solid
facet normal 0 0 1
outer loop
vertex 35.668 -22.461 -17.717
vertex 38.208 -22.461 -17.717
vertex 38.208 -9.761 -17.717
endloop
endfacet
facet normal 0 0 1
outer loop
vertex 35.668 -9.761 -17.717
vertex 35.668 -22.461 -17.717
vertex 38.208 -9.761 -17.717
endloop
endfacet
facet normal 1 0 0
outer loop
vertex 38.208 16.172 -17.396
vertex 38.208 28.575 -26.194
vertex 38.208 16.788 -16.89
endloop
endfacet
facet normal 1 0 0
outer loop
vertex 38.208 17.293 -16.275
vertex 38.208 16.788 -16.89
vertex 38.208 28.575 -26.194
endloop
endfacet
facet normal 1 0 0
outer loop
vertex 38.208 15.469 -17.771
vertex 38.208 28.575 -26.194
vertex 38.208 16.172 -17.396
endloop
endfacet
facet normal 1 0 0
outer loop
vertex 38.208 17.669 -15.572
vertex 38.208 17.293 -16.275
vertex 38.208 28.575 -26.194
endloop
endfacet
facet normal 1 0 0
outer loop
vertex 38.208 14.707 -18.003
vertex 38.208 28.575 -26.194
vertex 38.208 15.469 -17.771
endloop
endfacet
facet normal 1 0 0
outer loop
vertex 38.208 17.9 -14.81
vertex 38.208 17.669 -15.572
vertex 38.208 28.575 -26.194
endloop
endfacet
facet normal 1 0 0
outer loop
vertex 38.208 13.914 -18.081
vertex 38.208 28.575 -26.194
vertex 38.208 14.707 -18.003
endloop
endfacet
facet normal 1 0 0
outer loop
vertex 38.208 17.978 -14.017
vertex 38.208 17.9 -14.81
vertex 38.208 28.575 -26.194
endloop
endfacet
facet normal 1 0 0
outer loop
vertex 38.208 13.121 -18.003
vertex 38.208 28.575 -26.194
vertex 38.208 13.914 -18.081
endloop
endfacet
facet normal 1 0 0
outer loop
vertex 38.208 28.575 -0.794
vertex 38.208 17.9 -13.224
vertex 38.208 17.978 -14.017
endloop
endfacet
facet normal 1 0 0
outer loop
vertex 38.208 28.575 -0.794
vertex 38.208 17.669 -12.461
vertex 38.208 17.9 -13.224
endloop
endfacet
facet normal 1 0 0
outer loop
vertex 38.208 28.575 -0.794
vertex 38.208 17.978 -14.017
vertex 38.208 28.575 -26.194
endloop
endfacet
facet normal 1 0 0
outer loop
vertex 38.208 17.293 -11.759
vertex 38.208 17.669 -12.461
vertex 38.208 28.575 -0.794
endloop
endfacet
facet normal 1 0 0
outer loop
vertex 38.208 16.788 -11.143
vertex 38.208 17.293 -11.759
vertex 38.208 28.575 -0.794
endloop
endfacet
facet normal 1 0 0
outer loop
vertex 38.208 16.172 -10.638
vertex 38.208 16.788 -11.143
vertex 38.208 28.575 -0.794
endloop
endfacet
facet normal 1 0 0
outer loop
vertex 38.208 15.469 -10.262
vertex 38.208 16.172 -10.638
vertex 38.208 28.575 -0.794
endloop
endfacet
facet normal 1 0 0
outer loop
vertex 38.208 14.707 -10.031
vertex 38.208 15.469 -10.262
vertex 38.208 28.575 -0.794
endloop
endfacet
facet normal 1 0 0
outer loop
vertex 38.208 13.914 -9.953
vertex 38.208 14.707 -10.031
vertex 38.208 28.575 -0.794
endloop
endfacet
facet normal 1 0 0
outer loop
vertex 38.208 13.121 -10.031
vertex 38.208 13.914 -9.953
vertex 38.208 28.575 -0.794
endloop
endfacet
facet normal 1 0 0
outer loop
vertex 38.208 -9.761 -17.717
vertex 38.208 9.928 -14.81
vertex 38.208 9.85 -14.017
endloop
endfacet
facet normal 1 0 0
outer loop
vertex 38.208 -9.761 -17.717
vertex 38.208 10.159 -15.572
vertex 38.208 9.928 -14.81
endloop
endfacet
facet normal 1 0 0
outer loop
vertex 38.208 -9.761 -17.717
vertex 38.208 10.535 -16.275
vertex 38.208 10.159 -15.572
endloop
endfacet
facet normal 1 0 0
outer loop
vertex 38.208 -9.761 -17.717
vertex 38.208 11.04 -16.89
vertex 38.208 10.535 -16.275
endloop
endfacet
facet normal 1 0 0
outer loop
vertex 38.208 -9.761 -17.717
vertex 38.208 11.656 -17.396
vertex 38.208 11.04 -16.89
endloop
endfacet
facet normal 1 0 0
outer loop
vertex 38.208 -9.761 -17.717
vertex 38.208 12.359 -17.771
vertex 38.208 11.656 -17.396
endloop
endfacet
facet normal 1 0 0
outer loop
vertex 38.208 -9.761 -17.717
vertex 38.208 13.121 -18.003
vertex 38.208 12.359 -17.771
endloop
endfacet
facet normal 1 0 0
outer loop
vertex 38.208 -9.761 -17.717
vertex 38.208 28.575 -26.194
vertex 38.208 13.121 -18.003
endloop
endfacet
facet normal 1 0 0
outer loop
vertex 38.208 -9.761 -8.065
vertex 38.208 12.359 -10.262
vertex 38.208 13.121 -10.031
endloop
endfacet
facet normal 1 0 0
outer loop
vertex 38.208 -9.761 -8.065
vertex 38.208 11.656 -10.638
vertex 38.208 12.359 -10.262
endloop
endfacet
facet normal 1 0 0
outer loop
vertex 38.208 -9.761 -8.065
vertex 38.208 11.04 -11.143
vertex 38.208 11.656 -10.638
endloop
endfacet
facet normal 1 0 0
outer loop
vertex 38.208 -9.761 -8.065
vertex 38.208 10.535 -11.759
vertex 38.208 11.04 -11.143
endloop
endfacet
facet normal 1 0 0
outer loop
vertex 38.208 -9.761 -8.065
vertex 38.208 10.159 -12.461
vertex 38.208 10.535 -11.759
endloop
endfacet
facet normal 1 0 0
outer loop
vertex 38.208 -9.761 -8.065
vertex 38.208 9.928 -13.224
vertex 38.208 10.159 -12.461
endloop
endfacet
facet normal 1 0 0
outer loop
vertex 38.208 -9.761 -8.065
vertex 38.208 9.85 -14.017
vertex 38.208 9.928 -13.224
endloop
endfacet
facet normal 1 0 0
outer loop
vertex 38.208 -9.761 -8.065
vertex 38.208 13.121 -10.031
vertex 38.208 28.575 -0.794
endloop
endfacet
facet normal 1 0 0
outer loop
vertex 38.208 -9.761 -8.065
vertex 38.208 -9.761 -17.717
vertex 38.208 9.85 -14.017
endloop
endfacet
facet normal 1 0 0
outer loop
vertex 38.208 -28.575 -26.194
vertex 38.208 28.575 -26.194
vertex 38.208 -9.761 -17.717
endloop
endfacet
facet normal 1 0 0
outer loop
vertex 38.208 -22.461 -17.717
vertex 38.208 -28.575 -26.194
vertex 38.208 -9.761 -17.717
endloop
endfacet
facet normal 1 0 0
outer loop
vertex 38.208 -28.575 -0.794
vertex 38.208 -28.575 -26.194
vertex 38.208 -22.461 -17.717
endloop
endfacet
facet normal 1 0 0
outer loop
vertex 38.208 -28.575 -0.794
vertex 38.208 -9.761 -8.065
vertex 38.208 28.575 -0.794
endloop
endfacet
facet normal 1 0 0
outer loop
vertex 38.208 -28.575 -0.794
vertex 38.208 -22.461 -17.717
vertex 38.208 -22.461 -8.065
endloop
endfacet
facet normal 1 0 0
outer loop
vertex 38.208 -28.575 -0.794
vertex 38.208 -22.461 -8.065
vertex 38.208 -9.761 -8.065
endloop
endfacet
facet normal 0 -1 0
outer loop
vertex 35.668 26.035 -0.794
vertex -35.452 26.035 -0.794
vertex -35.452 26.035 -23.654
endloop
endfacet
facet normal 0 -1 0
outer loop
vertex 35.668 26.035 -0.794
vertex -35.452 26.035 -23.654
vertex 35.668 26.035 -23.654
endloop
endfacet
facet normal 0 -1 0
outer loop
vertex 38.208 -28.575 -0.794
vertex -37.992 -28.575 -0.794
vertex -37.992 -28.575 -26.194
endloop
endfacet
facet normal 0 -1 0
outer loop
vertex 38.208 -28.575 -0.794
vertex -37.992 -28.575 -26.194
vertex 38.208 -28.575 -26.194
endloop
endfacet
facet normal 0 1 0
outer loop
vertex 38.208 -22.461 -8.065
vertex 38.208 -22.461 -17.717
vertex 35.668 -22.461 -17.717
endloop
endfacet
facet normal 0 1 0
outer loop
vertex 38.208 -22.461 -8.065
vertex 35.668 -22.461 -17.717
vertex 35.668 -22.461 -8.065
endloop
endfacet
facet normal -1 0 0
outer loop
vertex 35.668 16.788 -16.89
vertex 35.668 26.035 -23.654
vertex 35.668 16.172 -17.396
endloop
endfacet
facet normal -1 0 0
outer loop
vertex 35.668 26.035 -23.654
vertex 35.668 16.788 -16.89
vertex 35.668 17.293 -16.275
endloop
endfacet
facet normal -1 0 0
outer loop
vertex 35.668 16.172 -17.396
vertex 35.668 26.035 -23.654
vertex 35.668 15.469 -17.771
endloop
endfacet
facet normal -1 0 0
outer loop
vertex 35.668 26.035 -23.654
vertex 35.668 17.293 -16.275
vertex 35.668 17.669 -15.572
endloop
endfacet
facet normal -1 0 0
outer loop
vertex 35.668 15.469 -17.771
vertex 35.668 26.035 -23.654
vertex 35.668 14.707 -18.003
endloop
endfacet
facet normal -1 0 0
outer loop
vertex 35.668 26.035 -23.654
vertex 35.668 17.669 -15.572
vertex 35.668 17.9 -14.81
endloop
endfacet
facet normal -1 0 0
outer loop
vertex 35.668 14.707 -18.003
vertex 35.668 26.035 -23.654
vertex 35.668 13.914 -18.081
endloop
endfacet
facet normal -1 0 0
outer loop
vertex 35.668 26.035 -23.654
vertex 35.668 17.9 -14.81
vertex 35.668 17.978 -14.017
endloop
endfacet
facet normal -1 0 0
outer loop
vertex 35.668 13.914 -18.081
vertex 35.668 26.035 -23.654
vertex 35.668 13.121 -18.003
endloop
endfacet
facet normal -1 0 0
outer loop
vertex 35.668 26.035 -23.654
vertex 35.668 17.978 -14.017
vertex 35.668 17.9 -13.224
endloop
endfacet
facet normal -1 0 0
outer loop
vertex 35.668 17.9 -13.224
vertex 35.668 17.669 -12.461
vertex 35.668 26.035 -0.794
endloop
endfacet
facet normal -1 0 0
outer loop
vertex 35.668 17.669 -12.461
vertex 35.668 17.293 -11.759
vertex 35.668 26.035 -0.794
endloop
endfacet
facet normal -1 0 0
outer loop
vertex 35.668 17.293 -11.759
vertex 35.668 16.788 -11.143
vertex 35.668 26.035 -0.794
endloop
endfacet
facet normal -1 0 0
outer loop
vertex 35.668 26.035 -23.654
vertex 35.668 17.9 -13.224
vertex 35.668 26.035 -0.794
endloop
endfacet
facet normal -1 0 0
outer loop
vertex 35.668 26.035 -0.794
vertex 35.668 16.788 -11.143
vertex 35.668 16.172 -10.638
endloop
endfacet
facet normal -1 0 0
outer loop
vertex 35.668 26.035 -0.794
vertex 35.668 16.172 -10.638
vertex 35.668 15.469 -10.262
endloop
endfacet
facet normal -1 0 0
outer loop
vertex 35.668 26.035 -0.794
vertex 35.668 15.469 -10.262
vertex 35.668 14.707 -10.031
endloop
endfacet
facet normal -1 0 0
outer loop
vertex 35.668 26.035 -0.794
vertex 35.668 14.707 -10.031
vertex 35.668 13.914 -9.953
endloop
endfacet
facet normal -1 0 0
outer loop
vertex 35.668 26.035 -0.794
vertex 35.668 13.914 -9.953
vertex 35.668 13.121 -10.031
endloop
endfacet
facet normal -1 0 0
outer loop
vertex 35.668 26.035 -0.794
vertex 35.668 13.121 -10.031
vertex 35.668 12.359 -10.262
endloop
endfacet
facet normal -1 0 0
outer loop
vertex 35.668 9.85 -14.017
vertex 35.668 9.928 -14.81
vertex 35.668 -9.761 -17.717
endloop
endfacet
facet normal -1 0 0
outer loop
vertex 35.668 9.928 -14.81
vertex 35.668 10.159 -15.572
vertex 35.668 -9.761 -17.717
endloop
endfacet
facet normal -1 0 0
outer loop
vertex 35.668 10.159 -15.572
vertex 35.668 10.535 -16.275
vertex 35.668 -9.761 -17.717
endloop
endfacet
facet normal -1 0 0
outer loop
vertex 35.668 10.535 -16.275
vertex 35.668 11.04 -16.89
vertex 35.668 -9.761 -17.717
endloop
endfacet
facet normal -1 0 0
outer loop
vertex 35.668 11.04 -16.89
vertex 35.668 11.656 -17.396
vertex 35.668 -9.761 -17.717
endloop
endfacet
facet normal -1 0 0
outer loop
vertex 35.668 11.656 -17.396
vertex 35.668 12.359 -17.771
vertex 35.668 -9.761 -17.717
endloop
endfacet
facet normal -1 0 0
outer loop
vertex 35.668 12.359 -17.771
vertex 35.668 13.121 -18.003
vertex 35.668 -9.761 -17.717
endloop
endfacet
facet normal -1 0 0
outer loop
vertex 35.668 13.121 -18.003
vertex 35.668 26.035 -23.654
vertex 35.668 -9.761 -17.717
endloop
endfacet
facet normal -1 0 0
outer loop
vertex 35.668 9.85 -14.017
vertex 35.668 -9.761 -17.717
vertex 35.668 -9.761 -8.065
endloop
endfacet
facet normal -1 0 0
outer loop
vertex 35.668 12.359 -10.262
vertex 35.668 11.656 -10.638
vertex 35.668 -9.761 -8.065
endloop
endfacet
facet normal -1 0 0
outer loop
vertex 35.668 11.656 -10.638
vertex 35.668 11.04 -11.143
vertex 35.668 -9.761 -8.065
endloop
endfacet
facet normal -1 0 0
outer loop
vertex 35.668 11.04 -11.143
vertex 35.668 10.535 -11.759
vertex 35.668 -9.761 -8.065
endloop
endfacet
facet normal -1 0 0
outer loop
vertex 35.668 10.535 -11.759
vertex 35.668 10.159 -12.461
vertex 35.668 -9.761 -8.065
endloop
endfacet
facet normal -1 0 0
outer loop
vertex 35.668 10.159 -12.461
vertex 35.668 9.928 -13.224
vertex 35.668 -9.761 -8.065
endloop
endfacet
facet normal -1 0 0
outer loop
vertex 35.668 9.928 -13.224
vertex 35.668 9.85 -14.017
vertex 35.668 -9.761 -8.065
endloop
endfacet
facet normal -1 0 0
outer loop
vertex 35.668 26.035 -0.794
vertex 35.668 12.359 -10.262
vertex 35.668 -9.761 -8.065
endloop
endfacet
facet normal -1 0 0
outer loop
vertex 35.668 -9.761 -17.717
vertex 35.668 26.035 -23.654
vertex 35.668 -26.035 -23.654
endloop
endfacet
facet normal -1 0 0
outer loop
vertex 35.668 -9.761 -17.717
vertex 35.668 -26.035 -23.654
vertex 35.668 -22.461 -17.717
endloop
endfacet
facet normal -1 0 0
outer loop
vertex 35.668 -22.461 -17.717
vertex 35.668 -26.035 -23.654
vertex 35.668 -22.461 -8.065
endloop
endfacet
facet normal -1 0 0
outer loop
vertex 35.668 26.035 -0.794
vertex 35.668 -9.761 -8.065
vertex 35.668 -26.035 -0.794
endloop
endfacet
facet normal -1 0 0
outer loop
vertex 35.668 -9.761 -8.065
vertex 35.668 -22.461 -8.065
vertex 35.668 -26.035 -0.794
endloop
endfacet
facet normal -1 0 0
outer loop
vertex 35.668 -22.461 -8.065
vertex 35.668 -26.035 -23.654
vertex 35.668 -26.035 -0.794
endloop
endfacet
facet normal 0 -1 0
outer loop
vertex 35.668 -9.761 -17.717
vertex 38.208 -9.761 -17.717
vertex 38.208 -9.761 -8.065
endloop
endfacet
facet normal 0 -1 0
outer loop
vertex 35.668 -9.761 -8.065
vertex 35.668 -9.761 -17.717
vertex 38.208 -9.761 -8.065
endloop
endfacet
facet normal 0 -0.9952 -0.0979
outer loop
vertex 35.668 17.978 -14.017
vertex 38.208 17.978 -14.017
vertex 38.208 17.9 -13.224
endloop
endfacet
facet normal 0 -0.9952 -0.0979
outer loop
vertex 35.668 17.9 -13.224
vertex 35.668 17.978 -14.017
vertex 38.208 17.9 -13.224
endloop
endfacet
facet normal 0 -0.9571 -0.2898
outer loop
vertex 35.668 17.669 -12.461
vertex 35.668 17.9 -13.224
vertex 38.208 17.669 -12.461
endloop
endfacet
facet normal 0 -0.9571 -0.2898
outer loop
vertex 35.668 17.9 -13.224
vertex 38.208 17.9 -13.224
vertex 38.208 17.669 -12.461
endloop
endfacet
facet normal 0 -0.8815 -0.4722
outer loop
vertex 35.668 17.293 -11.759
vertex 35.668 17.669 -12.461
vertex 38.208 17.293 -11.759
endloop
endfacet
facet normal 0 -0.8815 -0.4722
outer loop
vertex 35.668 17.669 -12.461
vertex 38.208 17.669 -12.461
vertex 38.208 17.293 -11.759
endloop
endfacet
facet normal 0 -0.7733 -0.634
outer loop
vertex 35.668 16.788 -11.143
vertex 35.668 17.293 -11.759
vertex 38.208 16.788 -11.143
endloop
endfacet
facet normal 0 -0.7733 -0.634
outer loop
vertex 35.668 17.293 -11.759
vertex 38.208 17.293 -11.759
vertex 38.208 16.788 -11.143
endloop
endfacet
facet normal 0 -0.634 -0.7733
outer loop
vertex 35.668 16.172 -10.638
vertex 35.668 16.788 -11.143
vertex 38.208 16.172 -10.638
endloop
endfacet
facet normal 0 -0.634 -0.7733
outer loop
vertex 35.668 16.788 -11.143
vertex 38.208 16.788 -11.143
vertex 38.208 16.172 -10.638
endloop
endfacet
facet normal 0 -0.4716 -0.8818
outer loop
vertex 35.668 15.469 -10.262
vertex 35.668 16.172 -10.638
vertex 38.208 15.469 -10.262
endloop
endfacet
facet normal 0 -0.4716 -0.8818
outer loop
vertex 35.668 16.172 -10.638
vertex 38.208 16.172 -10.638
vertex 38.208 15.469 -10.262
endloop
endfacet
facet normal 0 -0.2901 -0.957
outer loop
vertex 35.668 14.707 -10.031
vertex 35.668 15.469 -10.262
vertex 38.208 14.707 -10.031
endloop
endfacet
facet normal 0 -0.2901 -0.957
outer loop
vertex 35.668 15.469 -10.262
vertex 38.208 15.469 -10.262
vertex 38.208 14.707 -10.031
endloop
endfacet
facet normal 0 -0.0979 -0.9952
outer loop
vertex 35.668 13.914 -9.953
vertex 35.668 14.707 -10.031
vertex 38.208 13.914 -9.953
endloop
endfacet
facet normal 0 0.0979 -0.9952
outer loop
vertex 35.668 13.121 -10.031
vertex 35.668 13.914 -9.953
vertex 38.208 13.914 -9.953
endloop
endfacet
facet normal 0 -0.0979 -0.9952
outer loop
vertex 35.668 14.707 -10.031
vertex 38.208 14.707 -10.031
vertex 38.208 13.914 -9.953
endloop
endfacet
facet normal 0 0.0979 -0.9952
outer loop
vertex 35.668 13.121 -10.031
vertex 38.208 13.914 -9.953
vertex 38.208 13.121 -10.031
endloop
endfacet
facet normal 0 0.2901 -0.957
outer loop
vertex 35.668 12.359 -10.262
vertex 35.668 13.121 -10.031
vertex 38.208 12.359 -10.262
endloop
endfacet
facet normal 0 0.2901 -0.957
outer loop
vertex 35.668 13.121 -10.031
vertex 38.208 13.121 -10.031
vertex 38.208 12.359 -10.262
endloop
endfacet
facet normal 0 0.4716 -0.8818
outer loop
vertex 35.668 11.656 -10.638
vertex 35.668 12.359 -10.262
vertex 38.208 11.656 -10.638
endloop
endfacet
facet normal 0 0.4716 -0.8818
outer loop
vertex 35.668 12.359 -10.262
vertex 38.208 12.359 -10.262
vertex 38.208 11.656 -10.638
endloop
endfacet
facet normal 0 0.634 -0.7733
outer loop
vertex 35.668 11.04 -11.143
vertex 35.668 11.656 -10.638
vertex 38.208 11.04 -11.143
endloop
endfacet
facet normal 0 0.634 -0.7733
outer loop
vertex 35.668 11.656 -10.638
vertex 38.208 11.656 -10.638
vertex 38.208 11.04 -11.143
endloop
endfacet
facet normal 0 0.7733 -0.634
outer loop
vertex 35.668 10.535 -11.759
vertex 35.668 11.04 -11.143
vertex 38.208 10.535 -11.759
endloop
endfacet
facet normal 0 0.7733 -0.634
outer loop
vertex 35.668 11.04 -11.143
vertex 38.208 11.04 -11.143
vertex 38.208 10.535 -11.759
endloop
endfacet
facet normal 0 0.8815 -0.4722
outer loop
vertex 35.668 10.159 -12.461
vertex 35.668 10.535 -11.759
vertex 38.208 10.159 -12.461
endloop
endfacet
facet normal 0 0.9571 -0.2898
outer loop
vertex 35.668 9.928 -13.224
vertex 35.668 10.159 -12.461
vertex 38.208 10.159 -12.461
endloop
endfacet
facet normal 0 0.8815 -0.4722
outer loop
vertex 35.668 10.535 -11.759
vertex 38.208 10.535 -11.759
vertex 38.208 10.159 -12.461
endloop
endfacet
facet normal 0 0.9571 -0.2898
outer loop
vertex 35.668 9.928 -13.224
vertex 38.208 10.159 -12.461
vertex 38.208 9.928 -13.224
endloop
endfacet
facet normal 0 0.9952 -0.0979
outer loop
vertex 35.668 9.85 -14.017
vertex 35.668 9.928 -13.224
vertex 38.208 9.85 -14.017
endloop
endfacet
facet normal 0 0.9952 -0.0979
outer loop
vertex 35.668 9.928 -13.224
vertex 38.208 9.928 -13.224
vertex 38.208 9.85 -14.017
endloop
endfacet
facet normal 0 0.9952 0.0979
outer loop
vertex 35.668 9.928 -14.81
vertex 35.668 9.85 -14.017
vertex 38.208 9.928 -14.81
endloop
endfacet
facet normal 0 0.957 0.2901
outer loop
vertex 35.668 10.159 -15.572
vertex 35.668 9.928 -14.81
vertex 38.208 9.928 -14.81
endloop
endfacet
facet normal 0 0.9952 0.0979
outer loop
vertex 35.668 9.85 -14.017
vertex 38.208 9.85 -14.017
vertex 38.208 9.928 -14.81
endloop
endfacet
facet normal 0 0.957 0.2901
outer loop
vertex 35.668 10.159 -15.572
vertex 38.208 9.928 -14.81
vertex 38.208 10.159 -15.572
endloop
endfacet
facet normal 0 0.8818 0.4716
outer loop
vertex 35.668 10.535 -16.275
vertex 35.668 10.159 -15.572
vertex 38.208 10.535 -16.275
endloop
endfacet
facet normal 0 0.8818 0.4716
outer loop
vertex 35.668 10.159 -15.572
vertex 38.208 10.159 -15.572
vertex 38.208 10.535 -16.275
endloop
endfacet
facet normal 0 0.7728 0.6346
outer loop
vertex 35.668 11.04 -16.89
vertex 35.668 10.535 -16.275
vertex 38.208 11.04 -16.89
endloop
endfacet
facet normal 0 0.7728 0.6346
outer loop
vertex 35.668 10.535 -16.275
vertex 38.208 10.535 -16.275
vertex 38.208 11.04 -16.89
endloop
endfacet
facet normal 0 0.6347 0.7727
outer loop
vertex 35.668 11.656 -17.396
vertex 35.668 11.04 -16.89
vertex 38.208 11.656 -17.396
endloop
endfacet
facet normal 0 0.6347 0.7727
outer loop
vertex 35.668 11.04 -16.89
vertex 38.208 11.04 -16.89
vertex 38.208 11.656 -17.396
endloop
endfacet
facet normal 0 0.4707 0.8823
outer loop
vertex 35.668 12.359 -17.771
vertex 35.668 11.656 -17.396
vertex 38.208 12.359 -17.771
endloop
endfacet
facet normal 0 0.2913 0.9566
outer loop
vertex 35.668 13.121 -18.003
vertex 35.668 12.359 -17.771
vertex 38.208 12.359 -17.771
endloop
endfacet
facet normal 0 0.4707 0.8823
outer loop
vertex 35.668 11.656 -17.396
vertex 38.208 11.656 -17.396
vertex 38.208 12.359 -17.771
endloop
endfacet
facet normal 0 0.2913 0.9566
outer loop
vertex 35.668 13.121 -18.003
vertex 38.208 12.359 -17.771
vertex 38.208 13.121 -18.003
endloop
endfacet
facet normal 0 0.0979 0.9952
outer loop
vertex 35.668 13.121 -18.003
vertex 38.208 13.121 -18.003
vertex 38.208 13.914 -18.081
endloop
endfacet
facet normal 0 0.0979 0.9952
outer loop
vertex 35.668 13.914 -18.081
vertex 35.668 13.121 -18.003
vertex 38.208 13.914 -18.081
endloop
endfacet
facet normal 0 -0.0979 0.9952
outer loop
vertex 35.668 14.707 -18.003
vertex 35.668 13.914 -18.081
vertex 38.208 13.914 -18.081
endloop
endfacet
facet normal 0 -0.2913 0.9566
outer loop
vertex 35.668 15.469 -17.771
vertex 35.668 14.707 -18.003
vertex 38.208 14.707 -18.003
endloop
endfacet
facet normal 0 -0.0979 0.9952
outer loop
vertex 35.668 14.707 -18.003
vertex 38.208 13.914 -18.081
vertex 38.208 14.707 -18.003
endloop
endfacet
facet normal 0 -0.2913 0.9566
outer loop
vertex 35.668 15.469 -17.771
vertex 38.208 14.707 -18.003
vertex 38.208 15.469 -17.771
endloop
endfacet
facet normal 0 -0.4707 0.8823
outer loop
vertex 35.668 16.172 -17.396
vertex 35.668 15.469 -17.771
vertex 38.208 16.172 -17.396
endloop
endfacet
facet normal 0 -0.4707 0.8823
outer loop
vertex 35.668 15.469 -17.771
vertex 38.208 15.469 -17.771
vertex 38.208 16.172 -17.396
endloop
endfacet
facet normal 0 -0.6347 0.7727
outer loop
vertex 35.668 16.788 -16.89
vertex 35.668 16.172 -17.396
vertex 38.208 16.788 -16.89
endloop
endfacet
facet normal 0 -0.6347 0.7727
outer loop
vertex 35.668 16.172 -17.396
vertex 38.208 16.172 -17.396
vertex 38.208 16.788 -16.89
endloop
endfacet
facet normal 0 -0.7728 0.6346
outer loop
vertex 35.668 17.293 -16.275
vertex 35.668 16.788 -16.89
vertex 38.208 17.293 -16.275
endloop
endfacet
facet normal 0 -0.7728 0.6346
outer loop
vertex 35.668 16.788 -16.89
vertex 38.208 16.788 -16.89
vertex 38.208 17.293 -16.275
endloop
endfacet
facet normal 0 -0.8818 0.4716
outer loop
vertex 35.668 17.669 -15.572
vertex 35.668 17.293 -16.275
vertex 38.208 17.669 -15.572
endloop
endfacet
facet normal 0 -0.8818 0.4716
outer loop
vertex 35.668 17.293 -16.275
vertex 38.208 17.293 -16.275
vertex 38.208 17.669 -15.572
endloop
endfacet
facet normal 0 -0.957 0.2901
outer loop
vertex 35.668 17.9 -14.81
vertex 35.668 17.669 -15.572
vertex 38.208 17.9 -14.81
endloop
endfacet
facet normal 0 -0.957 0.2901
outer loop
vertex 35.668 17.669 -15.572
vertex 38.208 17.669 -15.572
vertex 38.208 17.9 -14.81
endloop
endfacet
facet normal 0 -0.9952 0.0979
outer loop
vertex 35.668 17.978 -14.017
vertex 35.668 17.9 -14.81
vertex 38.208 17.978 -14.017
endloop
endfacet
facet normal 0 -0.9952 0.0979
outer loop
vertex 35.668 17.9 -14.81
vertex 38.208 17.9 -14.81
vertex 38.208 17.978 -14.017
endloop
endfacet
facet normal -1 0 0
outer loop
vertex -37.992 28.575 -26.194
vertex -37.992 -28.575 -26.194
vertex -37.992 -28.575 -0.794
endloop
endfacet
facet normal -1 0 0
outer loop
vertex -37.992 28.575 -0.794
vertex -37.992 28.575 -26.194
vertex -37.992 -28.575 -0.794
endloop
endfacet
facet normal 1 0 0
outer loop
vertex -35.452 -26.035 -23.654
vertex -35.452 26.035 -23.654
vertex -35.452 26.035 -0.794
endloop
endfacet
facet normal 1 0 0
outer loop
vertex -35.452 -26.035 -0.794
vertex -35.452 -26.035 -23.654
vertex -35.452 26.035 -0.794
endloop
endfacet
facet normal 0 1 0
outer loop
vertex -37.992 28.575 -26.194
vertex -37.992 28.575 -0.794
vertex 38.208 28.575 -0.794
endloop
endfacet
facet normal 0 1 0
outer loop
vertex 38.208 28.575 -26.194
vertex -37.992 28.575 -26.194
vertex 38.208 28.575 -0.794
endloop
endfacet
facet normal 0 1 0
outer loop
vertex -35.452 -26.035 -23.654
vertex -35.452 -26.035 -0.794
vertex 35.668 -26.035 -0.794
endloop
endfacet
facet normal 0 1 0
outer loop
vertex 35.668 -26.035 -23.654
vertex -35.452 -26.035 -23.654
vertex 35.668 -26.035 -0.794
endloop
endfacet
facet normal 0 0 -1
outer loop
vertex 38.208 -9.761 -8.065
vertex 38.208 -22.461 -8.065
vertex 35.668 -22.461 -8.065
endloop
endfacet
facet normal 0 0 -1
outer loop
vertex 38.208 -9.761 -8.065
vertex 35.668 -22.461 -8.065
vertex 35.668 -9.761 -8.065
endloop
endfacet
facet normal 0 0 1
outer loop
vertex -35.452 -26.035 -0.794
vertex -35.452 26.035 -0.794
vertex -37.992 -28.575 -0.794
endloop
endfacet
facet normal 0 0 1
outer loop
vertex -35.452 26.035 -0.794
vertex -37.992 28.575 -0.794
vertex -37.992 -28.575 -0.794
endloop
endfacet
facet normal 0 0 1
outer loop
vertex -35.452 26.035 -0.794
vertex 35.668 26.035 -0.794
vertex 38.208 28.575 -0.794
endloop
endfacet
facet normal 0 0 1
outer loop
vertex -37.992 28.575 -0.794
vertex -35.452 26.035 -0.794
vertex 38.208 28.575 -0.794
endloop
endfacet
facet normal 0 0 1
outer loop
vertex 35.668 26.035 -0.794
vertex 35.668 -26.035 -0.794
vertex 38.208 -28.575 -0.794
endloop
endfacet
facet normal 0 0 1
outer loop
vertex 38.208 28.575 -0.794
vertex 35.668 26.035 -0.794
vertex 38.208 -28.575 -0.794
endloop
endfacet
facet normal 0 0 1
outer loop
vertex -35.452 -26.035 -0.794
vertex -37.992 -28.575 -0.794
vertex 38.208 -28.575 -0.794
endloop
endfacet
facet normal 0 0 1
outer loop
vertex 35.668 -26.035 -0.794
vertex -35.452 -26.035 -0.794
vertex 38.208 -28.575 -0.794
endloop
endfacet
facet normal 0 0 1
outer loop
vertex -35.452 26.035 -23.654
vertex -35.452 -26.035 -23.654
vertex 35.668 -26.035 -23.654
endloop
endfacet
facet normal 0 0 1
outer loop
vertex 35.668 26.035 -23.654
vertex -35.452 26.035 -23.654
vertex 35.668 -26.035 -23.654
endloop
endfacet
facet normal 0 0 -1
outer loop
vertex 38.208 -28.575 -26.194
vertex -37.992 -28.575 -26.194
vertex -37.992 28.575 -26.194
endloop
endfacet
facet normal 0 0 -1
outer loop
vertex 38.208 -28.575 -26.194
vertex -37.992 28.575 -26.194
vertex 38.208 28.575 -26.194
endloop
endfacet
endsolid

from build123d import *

# Parameters (mm, degrees)
F0_W     = 76.2
F0_H     = 25.4
F1_DEPTH = 28.575
F2_T     = -2.54
F3_R     = 4.064
F4_DEPTH = 2.54
F5_W     = 12.7
F5_H     = 9.652
F6_DEPTH = 2.54


with BuildPart() as f1:
    # F0 (on Front) → F1 (new body, symmetric)
    with BuildSketch(Plane.XZ):
        with Locations((0.107829, -13.494317)):
            Rectangle(F0_W, F0_H)
    extrude(amount=F1_DEPTH, both=True)

    # F2
    f2_openings = [f1.faces().sort_by_distance(p)[0] for p in [
        (0.107829, 0, -0.794317),
    ]]
    offset(amount=F2_T, openings=f2_openings)

    # F3 (on face) → F4 (cut, through all)
    with BuildSketch(Plane.YZ.offset(38.207829)):
        with Locations((13.913971, -14.016682)):
            Circle(F3_R)
    extrude(amount=-F4_DEPTH, mode=Mode.SUBTRACT)

    # F5 (on face) → F6 (cut, through all)
    with BuildSketch(Plane.YZ.offset(38.207829)):
        with Locations((-16.11085, -12.890838)):
            Rectangle(F5_W, F5_H)
    extrude(amount=-F6_DEPTH, mode=Mode.SUBTRACT)


solid = f1.part
